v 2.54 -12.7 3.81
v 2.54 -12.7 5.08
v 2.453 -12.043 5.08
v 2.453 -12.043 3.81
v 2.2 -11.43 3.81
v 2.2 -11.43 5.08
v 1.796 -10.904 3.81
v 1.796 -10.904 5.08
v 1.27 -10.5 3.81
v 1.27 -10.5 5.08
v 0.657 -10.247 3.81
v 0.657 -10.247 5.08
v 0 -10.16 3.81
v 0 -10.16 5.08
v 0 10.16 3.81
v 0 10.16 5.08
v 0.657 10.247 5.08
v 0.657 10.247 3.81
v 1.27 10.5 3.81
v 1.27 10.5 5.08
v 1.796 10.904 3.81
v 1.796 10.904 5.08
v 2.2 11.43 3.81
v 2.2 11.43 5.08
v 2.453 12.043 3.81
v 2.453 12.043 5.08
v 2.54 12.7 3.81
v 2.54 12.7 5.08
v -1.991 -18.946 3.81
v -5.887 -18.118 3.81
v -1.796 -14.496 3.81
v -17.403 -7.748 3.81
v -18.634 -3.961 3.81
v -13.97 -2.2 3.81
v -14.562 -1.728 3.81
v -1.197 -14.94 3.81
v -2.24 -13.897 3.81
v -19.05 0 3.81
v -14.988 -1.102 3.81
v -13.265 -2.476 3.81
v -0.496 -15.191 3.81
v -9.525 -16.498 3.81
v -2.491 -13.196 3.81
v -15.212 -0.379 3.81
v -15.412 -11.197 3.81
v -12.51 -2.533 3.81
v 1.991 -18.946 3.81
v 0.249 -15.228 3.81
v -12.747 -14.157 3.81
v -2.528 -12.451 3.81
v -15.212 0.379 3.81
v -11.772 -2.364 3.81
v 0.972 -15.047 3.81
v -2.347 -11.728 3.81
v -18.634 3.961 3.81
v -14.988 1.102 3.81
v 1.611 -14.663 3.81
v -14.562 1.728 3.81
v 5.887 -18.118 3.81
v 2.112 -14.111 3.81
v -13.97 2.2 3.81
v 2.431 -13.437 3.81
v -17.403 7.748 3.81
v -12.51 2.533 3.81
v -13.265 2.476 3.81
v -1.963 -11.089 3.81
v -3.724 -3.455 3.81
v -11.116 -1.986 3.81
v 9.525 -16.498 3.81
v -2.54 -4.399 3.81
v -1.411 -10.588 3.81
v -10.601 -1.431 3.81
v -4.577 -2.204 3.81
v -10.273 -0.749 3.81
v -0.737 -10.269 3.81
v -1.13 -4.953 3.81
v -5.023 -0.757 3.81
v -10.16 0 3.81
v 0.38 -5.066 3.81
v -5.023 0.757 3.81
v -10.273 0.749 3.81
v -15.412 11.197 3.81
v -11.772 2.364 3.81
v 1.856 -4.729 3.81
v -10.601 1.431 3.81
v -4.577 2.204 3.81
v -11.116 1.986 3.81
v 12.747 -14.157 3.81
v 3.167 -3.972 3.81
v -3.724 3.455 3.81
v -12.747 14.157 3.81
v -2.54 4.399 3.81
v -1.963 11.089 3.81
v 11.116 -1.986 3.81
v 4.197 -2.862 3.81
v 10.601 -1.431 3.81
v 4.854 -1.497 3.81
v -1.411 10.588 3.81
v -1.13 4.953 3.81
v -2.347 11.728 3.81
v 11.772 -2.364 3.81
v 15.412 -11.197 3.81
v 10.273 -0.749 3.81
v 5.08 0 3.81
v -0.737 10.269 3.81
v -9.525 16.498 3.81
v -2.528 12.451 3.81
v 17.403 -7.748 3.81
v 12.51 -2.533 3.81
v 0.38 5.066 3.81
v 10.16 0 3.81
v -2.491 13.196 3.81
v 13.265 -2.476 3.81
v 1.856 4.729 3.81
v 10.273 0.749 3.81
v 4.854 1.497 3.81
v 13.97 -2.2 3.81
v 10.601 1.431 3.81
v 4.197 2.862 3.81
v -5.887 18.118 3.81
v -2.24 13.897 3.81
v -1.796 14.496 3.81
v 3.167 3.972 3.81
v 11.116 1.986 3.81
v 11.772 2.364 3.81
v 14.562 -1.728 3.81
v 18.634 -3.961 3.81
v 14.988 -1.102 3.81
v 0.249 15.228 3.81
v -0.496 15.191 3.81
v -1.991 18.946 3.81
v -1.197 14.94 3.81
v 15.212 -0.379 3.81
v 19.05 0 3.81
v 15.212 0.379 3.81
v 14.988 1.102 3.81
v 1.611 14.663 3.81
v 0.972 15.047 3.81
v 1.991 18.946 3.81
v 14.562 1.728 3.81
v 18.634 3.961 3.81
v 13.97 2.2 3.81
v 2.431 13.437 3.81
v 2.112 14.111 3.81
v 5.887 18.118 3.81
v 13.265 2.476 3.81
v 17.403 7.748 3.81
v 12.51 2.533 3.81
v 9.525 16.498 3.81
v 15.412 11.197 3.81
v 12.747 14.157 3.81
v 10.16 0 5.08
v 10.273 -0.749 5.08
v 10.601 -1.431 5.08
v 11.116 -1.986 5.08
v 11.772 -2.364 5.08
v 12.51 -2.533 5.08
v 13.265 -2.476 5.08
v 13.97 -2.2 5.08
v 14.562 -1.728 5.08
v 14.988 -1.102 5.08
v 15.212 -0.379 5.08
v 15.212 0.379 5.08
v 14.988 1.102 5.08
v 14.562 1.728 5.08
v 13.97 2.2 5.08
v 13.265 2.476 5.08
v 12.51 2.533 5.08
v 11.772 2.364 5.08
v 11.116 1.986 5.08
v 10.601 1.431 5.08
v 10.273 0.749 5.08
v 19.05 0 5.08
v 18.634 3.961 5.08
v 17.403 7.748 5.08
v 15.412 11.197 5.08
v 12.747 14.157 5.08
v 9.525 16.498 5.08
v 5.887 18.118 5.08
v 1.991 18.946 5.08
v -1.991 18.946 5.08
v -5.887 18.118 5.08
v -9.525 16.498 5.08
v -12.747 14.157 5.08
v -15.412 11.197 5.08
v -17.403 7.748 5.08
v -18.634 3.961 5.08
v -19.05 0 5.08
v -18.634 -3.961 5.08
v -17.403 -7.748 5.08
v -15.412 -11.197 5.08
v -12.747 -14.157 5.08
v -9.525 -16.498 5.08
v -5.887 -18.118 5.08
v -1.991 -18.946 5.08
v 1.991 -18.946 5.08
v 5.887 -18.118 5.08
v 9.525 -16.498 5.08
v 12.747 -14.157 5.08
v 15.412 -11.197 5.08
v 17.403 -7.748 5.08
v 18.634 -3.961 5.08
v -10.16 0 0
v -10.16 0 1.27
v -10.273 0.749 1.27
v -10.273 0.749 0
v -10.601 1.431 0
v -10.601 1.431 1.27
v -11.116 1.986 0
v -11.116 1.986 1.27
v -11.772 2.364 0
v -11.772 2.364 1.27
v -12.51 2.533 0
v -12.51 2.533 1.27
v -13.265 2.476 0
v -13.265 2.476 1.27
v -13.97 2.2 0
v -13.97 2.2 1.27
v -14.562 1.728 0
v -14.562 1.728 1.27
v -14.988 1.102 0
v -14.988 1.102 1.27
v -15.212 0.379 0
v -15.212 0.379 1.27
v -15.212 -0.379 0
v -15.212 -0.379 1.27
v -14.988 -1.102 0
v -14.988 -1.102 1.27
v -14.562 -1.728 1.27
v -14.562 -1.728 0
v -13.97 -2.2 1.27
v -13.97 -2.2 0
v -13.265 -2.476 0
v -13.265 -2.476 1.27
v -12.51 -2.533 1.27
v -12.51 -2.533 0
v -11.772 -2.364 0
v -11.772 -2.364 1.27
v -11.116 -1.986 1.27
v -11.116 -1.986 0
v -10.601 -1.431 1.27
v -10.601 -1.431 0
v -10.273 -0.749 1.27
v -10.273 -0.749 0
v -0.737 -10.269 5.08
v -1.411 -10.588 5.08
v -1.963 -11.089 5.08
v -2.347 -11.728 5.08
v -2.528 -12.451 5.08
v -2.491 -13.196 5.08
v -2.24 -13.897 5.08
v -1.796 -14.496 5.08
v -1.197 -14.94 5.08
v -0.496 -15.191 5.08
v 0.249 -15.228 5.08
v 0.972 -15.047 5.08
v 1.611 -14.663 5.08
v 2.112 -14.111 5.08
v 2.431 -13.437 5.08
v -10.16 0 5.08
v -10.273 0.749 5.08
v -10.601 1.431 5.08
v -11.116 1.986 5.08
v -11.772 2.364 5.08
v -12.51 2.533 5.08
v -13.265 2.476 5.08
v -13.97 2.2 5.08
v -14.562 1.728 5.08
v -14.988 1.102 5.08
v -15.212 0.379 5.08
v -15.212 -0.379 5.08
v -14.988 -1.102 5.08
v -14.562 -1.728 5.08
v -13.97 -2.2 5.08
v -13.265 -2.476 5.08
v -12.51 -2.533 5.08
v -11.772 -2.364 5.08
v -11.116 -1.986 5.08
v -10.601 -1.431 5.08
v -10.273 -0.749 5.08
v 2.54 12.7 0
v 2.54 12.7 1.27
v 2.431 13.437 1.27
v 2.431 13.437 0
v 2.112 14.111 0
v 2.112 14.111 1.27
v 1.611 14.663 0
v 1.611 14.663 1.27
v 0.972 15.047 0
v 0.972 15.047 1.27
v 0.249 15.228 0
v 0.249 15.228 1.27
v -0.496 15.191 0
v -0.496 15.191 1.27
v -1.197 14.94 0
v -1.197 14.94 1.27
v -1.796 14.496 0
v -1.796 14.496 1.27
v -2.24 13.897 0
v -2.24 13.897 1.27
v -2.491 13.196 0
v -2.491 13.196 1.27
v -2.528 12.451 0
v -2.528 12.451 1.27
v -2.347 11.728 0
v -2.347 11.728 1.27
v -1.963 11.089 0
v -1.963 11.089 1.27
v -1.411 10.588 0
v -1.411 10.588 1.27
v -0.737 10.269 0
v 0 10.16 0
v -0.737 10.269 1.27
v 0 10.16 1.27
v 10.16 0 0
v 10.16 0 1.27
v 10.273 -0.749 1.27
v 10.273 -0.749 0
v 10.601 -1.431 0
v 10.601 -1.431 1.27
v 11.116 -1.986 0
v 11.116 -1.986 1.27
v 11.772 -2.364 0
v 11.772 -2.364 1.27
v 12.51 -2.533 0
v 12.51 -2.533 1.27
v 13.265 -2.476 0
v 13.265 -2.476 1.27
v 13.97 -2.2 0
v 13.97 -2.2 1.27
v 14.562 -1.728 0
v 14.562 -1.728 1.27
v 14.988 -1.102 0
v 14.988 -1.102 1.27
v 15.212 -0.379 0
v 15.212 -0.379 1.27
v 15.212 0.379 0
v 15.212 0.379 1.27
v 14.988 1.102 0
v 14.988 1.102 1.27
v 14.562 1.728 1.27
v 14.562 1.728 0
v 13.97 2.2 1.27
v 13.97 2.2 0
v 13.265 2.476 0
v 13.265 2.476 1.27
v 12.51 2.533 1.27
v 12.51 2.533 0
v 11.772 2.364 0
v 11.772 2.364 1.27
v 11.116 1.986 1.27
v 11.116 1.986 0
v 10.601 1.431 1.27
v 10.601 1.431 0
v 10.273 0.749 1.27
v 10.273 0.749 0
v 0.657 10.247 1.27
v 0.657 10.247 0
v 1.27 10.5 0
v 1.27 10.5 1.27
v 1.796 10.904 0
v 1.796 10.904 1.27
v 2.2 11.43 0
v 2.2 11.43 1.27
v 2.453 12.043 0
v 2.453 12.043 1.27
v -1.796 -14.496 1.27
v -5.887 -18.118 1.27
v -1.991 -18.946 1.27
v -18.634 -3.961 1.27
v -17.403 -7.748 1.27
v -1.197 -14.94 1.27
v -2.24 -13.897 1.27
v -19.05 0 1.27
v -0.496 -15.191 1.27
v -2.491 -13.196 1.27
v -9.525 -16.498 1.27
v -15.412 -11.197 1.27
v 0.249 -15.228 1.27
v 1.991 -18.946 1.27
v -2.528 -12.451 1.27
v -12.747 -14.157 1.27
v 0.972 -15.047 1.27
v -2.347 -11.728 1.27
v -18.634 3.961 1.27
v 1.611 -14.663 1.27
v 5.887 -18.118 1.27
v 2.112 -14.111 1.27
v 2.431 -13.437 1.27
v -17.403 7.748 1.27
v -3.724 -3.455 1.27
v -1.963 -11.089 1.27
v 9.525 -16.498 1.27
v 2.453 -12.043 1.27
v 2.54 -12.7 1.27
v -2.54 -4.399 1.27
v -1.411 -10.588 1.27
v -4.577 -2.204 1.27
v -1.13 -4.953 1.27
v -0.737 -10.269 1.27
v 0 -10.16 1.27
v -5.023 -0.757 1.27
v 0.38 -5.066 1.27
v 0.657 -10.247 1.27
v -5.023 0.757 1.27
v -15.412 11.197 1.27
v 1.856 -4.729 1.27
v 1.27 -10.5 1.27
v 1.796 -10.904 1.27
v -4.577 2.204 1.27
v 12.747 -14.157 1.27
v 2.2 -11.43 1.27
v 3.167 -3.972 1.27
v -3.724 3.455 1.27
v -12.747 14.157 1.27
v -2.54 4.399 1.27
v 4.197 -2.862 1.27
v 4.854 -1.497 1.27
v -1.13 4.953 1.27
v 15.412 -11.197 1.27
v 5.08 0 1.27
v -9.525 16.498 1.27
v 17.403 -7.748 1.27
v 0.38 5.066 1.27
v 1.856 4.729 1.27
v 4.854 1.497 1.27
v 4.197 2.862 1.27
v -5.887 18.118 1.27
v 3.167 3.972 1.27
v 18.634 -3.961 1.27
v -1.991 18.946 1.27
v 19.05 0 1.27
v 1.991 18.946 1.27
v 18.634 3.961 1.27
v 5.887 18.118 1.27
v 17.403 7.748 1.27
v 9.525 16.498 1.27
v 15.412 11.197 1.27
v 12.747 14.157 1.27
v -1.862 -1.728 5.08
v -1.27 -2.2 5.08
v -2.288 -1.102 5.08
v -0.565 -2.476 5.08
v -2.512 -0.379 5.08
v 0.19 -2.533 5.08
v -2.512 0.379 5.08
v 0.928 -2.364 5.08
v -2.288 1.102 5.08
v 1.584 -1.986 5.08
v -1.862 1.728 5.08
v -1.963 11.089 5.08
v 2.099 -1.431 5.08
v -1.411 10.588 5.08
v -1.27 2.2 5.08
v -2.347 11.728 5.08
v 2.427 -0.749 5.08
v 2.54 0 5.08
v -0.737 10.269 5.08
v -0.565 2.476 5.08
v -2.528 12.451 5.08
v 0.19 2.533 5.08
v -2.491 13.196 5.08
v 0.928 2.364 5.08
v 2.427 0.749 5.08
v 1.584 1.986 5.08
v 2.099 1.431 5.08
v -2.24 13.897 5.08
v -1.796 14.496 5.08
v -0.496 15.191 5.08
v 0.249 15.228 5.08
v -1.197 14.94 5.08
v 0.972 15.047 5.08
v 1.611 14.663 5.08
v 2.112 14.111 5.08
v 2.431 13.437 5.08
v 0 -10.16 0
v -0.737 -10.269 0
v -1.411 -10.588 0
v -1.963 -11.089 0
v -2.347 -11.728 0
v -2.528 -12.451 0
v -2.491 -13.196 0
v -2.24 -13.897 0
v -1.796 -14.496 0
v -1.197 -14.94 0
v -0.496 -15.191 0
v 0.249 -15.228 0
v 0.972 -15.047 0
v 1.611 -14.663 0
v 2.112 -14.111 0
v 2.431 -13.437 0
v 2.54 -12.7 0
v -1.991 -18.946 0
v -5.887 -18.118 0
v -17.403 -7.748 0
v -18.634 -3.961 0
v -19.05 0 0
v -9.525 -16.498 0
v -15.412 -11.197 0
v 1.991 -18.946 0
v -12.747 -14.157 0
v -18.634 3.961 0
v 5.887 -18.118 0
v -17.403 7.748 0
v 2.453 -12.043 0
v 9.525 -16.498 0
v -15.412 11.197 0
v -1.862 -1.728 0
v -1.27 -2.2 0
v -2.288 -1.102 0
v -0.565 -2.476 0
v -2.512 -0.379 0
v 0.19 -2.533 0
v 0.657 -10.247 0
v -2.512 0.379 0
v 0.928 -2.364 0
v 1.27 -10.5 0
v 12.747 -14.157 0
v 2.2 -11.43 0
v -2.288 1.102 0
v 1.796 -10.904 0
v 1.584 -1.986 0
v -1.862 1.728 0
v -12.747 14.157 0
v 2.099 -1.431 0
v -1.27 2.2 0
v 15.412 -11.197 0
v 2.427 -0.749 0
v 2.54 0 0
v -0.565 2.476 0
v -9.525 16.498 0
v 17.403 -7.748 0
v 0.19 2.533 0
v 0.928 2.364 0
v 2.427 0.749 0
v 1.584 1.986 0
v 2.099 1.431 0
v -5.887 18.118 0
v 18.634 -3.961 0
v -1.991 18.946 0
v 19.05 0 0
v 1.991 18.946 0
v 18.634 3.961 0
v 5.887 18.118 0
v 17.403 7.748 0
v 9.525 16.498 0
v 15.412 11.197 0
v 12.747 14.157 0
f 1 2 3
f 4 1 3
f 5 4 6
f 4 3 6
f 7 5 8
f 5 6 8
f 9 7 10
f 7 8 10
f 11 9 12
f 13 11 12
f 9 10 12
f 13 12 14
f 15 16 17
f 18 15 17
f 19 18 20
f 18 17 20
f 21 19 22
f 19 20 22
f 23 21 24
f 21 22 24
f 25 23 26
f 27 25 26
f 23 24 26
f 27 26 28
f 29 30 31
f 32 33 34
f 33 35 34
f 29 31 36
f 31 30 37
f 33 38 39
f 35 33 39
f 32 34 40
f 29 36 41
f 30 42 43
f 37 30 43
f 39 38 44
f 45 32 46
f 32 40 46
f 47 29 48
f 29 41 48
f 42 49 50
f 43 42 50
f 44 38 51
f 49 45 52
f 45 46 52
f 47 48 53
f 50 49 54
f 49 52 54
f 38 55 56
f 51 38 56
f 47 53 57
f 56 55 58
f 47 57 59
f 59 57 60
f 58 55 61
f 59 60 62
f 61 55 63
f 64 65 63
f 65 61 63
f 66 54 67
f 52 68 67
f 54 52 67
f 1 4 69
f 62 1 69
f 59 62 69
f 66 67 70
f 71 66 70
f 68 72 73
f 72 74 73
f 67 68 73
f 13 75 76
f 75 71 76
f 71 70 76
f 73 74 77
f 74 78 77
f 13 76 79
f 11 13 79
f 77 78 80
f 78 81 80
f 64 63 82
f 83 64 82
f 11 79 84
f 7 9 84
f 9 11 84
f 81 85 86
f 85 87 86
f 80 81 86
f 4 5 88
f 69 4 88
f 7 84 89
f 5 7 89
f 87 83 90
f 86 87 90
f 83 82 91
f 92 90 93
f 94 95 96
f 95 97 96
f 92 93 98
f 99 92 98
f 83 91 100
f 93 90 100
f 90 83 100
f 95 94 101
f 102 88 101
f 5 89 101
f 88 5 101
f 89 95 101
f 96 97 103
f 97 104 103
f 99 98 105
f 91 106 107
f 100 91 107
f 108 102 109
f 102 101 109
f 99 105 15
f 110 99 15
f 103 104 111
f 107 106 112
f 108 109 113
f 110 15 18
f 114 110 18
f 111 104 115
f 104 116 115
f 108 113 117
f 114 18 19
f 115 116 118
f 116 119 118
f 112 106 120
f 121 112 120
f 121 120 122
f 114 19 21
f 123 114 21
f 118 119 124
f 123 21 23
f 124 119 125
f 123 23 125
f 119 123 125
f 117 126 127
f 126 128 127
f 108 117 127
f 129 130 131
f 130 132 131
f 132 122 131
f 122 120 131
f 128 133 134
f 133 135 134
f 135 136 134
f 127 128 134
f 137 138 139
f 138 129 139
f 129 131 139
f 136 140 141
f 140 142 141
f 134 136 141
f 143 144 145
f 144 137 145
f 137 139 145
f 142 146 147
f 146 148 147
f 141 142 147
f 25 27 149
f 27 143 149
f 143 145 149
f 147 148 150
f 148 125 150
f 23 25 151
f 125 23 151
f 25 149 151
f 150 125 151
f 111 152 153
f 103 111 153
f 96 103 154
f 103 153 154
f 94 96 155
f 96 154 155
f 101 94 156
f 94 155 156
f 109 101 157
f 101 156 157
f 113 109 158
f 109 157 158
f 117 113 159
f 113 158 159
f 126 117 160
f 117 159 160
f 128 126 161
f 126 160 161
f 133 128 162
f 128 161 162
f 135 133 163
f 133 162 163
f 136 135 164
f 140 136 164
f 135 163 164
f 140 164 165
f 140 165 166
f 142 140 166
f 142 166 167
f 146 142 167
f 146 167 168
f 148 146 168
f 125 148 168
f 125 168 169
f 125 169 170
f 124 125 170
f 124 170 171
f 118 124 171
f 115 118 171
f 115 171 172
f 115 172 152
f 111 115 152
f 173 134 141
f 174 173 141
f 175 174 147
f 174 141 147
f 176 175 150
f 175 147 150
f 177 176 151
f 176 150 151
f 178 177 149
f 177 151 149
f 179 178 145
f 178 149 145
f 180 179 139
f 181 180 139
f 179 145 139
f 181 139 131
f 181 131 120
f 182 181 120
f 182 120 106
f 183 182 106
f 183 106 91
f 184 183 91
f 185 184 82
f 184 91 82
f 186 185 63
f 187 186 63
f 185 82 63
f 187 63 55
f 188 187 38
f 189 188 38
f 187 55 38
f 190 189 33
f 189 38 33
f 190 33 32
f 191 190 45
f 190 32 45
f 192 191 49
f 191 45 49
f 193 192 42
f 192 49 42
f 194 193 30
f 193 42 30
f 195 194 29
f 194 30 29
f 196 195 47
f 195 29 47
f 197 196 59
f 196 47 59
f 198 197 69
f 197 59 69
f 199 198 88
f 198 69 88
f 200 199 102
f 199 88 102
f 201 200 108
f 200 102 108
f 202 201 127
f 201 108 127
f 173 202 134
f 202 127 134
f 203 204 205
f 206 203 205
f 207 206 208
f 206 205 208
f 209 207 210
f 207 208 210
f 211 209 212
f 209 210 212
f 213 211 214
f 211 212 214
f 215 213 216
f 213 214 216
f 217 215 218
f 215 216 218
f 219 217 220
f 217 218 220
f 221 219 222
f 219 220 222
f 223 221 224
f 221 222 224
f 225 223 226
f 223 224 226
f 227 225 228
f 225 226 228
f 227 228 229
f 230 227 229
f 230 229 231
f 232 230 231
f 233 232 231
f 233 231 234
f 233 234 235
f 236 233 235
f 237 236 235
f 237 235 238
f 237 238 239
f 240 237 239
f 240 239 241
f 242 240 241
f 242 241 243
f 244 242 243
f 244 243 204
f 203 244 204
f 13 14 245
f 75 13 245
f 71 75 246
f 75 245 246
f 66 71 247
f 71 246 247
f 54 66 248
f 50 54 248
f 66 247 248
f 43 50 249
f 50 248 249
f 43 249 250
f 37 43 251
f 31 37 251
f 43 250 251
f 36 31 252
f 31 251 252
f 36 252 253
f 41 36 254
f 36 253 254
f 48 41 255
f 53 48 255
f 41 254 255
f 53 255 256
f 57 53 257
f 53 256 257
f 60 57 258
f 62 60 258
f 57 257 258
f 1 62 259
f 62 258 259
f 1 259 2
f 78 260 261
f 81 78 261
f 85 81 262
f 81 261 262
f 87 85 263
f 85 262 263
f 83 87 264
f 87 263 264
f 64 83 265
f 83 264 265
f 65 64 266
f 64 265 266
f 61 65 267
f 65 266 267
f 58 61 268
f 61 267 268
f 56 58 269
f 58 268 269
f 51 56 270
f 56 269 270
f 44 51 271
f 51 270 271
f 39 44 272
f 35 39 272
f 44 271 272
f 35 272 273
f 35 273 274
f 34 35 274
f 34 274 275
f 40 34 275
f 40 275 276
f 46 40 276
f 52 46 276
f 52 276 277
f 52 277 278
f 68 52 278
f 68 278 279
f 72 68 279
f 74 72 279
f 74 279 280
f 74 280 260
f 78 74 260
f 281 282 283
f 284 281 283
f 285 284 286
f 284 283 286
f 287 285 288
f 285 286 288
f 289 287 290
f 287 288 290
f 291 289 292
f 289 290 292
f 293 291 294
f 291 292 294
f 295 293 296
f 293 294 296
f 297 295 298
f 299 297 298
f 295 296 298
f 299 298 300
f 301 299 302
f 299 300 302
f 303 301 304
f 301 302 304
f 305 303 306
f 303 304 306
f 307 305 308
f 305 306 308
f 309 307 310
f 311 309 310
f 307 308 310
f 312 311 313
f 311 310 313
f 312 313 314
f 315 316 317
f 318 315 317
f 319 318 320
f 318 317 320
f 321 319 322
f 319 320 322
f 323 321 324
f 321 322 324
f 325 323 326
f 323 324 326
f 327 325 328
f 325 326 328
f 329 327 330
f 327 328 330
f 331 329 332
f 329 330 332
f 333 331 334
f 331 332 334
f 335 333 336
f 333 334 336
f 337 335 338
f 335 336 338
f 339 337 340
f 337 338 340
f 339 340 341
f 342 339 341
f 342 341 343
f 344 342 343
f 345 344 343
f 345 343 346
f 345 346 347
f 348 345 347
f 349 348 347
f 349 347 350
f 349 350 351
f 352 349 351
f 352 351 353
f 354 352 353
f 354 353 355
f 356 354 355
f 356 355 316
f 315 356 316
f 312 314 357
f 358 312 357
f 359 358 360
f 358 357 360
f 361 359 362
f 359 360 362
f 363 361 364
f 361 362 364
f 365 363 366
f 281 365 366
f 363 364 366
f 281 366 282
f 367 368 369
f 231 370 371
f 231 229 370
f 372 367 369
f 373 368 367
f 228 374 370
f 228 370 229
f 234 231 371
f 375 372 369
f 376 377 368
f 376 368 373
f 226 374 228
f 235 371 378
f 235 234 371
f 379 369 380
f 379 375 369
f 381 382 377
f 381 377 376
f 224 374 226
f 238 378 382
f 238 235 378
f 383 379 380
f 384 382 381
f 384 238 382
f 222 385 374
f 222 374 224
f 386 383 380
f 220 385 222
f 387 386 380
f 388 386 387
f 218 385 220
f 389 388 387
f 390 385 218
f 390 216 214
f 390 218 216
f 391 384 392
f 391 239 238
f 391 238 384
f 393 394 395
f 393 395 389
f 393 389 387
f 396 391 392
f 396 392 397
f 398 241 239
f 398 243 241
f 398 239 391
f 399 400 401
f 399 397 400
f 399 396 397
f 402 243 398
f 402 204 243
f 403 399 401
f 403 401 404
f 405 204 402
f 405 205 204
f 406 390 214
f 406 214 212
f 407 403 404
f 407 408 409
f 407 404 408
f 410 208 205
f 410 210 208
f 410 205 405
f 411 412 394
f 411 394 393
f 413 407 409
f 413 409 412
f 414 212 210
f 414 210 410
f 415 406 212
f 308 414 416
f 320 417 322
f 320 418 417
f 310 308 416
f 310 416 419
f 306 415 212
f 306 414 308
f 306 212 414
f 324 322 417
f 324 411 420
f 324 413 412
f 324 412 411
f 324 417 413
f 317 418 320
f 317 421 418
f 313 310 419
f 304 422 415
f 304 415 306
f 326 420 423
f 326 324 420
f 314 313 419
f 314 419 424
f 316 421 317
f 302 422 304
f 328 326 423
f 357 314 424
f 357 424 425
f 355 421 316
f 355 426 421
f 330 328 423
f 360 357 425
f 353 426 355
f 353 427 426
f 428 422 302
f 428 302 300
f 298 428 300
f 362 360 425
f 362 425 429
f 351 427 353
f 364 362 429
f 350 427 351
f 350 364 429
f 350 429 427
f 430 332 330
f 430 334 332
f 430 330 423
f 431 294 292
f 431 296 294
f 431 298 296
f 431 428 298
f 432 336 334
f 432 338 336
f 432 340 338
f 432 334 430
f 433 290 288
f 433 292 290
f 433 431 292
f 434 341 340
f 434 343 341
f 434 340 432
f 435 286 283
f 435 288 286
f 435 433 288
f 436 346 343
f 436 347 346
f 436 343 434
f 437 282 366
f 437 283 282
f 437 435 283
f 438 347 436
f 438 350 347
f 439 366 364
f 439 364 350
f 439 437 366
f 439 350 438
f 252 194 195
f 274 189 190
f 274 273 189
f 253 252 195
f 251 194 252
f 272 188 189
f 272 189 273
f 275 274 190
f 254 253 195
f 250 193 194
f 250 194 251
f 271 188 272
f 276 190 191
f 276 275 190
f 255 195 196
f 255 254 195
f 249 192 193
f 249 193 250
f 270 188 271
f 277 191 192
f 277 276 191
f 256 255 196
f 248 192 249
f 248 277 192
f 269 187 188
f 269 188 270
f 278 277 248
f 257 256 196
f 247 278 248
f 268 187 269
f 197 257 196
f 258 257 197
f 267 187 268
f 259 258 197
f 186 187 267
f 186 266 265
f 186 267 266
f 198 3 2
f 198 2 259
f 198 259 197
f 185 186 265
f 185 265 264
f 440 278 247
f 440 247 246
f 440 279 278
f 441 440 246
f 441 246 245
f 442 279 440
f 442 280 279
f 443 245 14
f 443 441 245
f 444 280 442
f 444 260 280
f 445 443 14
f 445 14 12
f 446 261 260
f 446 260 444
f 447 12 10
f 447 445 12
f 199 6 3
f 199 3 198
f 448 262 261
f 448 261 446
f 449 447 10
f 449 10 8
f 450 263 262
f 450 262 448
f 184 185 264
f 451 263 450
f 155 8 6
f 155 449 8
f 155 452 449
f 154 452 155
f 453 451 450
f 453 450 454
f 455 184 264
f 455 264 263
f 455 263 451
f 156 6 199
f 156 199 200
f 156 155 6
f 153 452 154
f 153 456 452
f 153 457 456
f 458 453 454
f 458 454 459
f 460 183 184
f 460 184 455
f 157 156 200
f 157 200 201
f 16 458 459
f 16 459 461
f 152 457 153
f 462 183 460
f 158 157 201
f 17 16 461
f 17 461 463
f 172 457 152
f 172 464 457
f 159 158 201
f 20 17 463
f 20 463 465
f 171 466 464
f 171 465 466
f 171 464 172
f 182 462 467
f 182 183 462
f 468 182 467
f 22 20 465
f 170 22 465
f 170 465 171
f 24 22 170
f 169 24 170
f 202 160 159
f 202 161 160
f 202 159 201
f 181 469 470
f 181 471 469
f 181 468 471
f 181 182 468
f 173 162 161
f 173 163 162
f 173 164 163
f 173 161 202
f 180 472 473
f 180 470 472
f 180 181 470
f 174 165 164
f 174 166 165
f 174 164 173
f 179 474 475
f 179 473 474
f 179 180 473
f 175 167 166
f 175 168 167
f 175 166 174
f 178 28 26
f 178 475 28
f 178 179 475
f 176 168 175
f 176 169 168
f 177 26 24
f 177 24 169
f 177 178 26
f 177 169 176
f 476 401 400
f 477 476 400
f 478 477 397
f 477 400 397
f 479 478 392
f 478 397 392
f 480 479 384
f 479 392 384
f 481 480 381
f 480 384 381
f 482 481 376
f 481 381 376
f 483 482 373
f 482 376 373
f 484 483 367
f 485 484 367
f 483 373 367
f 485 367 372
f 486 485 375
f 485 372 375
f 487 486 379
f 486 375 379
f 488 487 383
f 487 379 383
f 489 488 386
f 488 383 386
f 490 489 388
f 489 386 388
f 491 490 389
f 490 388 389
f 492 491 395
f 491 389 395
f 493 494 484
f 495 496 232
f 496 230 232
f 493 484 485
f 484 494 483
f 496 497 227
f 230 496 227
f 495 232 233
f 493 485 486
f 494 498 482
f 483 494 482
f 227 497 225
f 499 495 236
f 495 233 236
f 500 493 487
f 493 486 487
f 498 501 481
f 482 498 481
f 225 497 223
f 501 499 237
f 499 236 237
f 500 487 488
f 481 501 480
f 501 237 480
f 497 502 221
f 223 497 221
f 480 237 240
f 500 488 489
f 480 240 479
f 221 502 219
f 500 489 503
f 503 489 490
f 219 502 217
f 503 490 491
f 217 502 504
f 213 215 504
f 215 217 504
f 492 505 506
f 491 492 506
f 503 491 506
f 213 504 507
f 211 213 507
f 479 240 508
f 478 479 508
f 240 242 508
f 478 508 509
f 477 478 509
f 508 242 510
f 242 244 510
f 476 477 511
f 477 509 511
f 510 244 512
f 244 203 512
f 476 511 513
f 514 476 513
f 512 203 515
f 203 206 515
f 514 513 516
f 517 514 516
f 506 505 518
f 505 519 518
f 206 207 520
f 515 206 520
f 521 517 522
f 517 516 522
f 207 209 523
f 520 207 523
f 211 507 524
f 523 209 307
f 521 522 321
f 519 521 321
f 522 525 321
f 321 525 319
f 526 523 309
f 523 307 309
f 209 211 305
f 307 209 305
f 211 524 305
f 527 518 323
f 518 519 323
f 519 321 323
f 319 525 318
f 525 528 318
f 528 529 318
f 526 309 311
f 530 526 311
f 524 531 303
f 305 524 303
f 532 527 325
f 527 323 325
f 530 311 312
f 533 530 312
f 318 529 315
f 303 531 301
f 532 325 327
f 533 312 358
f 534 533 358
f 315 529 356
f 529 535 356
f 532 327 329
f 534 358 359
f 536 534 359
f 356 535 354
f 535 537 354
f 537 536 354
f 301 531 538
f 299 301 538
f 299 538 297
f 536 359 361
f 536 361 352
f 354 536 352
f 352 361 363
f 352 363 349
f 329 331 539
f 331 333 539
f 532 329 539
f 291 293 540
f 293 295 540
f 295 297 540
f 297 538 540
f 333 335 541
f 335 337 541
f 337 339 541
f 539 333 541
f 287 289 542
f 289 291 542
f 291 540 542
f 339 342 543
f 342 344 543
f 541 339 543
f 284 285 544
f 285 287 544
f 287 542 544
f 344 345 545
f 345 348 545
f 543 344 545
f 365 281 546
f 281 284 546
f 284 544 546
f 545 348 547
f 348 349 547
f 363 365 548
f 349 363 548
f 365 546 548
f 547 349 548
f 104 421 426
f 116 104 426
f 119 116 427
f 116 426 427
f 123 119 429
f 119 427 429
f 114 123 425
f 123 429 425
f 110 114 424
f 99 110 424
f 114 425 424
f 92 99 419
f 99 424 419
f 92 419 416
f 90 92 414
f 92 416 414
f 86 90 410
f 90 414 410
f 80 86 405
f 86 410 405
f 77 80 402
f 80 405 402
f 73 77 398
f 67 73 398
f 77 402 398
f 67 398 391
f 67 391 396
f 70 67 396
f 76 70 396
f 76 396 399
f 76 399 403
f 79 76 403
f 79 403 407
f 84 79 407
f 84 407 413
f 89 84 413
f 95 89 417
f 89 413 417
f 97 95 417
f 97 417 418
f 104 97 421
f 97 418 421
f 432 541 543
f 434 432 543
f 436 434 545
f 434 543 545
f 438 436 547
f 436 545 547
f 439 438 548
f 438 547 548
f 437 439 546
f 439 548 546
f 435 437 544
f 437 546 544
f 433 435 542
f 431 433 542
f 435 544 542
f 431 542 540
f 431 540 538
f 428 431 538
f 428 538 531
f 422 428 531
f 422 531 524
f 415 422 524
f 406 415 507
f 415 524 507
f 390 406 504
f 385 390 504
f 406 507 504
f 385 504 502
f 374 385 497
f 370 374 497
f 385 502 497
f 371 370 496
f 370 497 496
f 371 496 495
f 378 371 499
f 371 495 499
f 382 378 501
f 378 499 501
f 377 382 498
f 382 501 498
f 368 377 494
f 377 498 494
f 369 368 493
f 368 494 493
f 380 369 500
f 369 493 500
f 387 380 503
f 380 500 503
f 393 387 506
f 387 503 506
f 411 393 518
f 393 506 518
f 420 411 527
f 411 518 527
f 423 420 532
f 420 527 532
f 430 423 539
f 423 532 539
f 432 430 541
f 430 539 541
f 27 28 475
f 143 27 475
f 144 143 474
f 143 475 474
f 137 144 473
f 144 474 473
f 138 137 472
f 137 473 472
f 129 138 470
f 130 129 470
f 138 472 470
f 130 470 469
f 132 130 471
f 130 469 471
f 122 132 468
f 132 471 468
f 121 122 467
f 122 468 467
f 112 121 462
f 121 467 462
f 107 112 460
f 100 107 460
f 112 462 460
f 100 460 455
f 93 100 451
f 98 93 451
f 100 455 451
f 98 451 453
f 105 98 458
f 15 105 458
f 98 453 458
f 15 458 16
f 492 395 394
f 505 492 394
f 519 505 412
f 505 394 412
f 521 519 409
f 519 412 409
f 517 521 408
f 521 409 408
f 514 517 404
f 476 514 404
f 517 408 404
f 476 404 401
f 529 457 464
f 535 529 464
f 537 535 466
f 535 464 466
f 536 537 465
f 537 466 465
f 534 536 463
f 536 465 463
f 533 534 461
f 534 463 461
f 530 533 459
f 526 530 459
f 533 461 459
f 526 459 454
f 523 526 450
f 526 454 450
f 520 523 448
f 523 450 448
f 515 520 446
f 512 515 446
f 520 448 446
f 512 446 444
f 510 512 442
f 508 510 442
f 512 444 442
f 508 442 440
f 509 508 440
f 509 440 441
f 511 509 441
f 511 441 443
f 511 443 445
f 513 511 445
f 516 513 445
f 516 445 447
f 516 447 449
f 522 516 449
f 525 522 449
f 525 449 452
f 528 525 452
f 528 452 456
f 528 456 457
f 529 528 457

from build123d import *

# Parameters (mm, degrees)
F0_R     = 19.05
F1_DEPTH = 1.27
F2_R     = 5.08
F3_DEPTH = 2.54
F4_R     = 19.05
F4_R_2   = 5.08
F5_DEPTH = 1.27
F6_R     = 2.54
F7_DEPTH = 25.4
F8_R     = 2.54
F9_DEPTH = 25.4


with BuildPart() as f1:
    # F0 (on Top) → F1 (new body)
    with BuildSketch(Plane.XY):
        Circle(F0_R)
    extrude(amount=F1_DEPTH)

    # F2 (on face) → F3 (join)
    with BuildSketch(Plane.XY.offset(1.27)):
        Circle(F2_R)
    extrude(amount=F3_DEPTH)

    # F4 (on face) → F5 (join)
    with BuildSketch(Plane.XY.offset(3.81)):
        Circle(F4_R)
        Circle(F4_R_2, mode=Mode.SUBTRACT)
        Circle(F4_R_2)
    extrude(amount=F5_DEPTH)

    # F6 (on face) → F7 (cut)
    with BuildSketch(Plane.XY.offset(5.08)):
        Circle(F6_R)
    extrude(amount=-F7_DEPTH, mode=Mode.SUBTRACT)

    # F8 (on face) → F9 (cut)
    with BuildSketch(Plane.XY.offset(5.08)):
        with BuildLine():
            ThreePointArc((0, 10.16), (1.7960512242, 10.9039487758), (2.54, 12.7))
            ThreePointArc((2.54, 12.7), (-1.7960512242, 14.4960512242), (0, 10.16))
        make_face()
        with BuildLine():
            ThreePointArc((15.24, 0), (12.7, 2.54), (10.16, 0))
            ThreePointArc((10.16, 0), (12.7, -2.54), (15.24, 0))
        make_face()
        with BuildLine():
            ThreePointArc((2.54, -12.7), (1.7960512242, -10.9039487758), (0, -10.16))
            ThreePointArc((0, -10.16), (-1.7960512242, -14.4960512242), (2.54, -12.7))
        make_face()
        with Locations((-12.7, 0)):
            Circle(F8_R)
    extrude(amount=-F9_DEPTH, mode=Mode.SUBTRACT)


solid = f1.part
